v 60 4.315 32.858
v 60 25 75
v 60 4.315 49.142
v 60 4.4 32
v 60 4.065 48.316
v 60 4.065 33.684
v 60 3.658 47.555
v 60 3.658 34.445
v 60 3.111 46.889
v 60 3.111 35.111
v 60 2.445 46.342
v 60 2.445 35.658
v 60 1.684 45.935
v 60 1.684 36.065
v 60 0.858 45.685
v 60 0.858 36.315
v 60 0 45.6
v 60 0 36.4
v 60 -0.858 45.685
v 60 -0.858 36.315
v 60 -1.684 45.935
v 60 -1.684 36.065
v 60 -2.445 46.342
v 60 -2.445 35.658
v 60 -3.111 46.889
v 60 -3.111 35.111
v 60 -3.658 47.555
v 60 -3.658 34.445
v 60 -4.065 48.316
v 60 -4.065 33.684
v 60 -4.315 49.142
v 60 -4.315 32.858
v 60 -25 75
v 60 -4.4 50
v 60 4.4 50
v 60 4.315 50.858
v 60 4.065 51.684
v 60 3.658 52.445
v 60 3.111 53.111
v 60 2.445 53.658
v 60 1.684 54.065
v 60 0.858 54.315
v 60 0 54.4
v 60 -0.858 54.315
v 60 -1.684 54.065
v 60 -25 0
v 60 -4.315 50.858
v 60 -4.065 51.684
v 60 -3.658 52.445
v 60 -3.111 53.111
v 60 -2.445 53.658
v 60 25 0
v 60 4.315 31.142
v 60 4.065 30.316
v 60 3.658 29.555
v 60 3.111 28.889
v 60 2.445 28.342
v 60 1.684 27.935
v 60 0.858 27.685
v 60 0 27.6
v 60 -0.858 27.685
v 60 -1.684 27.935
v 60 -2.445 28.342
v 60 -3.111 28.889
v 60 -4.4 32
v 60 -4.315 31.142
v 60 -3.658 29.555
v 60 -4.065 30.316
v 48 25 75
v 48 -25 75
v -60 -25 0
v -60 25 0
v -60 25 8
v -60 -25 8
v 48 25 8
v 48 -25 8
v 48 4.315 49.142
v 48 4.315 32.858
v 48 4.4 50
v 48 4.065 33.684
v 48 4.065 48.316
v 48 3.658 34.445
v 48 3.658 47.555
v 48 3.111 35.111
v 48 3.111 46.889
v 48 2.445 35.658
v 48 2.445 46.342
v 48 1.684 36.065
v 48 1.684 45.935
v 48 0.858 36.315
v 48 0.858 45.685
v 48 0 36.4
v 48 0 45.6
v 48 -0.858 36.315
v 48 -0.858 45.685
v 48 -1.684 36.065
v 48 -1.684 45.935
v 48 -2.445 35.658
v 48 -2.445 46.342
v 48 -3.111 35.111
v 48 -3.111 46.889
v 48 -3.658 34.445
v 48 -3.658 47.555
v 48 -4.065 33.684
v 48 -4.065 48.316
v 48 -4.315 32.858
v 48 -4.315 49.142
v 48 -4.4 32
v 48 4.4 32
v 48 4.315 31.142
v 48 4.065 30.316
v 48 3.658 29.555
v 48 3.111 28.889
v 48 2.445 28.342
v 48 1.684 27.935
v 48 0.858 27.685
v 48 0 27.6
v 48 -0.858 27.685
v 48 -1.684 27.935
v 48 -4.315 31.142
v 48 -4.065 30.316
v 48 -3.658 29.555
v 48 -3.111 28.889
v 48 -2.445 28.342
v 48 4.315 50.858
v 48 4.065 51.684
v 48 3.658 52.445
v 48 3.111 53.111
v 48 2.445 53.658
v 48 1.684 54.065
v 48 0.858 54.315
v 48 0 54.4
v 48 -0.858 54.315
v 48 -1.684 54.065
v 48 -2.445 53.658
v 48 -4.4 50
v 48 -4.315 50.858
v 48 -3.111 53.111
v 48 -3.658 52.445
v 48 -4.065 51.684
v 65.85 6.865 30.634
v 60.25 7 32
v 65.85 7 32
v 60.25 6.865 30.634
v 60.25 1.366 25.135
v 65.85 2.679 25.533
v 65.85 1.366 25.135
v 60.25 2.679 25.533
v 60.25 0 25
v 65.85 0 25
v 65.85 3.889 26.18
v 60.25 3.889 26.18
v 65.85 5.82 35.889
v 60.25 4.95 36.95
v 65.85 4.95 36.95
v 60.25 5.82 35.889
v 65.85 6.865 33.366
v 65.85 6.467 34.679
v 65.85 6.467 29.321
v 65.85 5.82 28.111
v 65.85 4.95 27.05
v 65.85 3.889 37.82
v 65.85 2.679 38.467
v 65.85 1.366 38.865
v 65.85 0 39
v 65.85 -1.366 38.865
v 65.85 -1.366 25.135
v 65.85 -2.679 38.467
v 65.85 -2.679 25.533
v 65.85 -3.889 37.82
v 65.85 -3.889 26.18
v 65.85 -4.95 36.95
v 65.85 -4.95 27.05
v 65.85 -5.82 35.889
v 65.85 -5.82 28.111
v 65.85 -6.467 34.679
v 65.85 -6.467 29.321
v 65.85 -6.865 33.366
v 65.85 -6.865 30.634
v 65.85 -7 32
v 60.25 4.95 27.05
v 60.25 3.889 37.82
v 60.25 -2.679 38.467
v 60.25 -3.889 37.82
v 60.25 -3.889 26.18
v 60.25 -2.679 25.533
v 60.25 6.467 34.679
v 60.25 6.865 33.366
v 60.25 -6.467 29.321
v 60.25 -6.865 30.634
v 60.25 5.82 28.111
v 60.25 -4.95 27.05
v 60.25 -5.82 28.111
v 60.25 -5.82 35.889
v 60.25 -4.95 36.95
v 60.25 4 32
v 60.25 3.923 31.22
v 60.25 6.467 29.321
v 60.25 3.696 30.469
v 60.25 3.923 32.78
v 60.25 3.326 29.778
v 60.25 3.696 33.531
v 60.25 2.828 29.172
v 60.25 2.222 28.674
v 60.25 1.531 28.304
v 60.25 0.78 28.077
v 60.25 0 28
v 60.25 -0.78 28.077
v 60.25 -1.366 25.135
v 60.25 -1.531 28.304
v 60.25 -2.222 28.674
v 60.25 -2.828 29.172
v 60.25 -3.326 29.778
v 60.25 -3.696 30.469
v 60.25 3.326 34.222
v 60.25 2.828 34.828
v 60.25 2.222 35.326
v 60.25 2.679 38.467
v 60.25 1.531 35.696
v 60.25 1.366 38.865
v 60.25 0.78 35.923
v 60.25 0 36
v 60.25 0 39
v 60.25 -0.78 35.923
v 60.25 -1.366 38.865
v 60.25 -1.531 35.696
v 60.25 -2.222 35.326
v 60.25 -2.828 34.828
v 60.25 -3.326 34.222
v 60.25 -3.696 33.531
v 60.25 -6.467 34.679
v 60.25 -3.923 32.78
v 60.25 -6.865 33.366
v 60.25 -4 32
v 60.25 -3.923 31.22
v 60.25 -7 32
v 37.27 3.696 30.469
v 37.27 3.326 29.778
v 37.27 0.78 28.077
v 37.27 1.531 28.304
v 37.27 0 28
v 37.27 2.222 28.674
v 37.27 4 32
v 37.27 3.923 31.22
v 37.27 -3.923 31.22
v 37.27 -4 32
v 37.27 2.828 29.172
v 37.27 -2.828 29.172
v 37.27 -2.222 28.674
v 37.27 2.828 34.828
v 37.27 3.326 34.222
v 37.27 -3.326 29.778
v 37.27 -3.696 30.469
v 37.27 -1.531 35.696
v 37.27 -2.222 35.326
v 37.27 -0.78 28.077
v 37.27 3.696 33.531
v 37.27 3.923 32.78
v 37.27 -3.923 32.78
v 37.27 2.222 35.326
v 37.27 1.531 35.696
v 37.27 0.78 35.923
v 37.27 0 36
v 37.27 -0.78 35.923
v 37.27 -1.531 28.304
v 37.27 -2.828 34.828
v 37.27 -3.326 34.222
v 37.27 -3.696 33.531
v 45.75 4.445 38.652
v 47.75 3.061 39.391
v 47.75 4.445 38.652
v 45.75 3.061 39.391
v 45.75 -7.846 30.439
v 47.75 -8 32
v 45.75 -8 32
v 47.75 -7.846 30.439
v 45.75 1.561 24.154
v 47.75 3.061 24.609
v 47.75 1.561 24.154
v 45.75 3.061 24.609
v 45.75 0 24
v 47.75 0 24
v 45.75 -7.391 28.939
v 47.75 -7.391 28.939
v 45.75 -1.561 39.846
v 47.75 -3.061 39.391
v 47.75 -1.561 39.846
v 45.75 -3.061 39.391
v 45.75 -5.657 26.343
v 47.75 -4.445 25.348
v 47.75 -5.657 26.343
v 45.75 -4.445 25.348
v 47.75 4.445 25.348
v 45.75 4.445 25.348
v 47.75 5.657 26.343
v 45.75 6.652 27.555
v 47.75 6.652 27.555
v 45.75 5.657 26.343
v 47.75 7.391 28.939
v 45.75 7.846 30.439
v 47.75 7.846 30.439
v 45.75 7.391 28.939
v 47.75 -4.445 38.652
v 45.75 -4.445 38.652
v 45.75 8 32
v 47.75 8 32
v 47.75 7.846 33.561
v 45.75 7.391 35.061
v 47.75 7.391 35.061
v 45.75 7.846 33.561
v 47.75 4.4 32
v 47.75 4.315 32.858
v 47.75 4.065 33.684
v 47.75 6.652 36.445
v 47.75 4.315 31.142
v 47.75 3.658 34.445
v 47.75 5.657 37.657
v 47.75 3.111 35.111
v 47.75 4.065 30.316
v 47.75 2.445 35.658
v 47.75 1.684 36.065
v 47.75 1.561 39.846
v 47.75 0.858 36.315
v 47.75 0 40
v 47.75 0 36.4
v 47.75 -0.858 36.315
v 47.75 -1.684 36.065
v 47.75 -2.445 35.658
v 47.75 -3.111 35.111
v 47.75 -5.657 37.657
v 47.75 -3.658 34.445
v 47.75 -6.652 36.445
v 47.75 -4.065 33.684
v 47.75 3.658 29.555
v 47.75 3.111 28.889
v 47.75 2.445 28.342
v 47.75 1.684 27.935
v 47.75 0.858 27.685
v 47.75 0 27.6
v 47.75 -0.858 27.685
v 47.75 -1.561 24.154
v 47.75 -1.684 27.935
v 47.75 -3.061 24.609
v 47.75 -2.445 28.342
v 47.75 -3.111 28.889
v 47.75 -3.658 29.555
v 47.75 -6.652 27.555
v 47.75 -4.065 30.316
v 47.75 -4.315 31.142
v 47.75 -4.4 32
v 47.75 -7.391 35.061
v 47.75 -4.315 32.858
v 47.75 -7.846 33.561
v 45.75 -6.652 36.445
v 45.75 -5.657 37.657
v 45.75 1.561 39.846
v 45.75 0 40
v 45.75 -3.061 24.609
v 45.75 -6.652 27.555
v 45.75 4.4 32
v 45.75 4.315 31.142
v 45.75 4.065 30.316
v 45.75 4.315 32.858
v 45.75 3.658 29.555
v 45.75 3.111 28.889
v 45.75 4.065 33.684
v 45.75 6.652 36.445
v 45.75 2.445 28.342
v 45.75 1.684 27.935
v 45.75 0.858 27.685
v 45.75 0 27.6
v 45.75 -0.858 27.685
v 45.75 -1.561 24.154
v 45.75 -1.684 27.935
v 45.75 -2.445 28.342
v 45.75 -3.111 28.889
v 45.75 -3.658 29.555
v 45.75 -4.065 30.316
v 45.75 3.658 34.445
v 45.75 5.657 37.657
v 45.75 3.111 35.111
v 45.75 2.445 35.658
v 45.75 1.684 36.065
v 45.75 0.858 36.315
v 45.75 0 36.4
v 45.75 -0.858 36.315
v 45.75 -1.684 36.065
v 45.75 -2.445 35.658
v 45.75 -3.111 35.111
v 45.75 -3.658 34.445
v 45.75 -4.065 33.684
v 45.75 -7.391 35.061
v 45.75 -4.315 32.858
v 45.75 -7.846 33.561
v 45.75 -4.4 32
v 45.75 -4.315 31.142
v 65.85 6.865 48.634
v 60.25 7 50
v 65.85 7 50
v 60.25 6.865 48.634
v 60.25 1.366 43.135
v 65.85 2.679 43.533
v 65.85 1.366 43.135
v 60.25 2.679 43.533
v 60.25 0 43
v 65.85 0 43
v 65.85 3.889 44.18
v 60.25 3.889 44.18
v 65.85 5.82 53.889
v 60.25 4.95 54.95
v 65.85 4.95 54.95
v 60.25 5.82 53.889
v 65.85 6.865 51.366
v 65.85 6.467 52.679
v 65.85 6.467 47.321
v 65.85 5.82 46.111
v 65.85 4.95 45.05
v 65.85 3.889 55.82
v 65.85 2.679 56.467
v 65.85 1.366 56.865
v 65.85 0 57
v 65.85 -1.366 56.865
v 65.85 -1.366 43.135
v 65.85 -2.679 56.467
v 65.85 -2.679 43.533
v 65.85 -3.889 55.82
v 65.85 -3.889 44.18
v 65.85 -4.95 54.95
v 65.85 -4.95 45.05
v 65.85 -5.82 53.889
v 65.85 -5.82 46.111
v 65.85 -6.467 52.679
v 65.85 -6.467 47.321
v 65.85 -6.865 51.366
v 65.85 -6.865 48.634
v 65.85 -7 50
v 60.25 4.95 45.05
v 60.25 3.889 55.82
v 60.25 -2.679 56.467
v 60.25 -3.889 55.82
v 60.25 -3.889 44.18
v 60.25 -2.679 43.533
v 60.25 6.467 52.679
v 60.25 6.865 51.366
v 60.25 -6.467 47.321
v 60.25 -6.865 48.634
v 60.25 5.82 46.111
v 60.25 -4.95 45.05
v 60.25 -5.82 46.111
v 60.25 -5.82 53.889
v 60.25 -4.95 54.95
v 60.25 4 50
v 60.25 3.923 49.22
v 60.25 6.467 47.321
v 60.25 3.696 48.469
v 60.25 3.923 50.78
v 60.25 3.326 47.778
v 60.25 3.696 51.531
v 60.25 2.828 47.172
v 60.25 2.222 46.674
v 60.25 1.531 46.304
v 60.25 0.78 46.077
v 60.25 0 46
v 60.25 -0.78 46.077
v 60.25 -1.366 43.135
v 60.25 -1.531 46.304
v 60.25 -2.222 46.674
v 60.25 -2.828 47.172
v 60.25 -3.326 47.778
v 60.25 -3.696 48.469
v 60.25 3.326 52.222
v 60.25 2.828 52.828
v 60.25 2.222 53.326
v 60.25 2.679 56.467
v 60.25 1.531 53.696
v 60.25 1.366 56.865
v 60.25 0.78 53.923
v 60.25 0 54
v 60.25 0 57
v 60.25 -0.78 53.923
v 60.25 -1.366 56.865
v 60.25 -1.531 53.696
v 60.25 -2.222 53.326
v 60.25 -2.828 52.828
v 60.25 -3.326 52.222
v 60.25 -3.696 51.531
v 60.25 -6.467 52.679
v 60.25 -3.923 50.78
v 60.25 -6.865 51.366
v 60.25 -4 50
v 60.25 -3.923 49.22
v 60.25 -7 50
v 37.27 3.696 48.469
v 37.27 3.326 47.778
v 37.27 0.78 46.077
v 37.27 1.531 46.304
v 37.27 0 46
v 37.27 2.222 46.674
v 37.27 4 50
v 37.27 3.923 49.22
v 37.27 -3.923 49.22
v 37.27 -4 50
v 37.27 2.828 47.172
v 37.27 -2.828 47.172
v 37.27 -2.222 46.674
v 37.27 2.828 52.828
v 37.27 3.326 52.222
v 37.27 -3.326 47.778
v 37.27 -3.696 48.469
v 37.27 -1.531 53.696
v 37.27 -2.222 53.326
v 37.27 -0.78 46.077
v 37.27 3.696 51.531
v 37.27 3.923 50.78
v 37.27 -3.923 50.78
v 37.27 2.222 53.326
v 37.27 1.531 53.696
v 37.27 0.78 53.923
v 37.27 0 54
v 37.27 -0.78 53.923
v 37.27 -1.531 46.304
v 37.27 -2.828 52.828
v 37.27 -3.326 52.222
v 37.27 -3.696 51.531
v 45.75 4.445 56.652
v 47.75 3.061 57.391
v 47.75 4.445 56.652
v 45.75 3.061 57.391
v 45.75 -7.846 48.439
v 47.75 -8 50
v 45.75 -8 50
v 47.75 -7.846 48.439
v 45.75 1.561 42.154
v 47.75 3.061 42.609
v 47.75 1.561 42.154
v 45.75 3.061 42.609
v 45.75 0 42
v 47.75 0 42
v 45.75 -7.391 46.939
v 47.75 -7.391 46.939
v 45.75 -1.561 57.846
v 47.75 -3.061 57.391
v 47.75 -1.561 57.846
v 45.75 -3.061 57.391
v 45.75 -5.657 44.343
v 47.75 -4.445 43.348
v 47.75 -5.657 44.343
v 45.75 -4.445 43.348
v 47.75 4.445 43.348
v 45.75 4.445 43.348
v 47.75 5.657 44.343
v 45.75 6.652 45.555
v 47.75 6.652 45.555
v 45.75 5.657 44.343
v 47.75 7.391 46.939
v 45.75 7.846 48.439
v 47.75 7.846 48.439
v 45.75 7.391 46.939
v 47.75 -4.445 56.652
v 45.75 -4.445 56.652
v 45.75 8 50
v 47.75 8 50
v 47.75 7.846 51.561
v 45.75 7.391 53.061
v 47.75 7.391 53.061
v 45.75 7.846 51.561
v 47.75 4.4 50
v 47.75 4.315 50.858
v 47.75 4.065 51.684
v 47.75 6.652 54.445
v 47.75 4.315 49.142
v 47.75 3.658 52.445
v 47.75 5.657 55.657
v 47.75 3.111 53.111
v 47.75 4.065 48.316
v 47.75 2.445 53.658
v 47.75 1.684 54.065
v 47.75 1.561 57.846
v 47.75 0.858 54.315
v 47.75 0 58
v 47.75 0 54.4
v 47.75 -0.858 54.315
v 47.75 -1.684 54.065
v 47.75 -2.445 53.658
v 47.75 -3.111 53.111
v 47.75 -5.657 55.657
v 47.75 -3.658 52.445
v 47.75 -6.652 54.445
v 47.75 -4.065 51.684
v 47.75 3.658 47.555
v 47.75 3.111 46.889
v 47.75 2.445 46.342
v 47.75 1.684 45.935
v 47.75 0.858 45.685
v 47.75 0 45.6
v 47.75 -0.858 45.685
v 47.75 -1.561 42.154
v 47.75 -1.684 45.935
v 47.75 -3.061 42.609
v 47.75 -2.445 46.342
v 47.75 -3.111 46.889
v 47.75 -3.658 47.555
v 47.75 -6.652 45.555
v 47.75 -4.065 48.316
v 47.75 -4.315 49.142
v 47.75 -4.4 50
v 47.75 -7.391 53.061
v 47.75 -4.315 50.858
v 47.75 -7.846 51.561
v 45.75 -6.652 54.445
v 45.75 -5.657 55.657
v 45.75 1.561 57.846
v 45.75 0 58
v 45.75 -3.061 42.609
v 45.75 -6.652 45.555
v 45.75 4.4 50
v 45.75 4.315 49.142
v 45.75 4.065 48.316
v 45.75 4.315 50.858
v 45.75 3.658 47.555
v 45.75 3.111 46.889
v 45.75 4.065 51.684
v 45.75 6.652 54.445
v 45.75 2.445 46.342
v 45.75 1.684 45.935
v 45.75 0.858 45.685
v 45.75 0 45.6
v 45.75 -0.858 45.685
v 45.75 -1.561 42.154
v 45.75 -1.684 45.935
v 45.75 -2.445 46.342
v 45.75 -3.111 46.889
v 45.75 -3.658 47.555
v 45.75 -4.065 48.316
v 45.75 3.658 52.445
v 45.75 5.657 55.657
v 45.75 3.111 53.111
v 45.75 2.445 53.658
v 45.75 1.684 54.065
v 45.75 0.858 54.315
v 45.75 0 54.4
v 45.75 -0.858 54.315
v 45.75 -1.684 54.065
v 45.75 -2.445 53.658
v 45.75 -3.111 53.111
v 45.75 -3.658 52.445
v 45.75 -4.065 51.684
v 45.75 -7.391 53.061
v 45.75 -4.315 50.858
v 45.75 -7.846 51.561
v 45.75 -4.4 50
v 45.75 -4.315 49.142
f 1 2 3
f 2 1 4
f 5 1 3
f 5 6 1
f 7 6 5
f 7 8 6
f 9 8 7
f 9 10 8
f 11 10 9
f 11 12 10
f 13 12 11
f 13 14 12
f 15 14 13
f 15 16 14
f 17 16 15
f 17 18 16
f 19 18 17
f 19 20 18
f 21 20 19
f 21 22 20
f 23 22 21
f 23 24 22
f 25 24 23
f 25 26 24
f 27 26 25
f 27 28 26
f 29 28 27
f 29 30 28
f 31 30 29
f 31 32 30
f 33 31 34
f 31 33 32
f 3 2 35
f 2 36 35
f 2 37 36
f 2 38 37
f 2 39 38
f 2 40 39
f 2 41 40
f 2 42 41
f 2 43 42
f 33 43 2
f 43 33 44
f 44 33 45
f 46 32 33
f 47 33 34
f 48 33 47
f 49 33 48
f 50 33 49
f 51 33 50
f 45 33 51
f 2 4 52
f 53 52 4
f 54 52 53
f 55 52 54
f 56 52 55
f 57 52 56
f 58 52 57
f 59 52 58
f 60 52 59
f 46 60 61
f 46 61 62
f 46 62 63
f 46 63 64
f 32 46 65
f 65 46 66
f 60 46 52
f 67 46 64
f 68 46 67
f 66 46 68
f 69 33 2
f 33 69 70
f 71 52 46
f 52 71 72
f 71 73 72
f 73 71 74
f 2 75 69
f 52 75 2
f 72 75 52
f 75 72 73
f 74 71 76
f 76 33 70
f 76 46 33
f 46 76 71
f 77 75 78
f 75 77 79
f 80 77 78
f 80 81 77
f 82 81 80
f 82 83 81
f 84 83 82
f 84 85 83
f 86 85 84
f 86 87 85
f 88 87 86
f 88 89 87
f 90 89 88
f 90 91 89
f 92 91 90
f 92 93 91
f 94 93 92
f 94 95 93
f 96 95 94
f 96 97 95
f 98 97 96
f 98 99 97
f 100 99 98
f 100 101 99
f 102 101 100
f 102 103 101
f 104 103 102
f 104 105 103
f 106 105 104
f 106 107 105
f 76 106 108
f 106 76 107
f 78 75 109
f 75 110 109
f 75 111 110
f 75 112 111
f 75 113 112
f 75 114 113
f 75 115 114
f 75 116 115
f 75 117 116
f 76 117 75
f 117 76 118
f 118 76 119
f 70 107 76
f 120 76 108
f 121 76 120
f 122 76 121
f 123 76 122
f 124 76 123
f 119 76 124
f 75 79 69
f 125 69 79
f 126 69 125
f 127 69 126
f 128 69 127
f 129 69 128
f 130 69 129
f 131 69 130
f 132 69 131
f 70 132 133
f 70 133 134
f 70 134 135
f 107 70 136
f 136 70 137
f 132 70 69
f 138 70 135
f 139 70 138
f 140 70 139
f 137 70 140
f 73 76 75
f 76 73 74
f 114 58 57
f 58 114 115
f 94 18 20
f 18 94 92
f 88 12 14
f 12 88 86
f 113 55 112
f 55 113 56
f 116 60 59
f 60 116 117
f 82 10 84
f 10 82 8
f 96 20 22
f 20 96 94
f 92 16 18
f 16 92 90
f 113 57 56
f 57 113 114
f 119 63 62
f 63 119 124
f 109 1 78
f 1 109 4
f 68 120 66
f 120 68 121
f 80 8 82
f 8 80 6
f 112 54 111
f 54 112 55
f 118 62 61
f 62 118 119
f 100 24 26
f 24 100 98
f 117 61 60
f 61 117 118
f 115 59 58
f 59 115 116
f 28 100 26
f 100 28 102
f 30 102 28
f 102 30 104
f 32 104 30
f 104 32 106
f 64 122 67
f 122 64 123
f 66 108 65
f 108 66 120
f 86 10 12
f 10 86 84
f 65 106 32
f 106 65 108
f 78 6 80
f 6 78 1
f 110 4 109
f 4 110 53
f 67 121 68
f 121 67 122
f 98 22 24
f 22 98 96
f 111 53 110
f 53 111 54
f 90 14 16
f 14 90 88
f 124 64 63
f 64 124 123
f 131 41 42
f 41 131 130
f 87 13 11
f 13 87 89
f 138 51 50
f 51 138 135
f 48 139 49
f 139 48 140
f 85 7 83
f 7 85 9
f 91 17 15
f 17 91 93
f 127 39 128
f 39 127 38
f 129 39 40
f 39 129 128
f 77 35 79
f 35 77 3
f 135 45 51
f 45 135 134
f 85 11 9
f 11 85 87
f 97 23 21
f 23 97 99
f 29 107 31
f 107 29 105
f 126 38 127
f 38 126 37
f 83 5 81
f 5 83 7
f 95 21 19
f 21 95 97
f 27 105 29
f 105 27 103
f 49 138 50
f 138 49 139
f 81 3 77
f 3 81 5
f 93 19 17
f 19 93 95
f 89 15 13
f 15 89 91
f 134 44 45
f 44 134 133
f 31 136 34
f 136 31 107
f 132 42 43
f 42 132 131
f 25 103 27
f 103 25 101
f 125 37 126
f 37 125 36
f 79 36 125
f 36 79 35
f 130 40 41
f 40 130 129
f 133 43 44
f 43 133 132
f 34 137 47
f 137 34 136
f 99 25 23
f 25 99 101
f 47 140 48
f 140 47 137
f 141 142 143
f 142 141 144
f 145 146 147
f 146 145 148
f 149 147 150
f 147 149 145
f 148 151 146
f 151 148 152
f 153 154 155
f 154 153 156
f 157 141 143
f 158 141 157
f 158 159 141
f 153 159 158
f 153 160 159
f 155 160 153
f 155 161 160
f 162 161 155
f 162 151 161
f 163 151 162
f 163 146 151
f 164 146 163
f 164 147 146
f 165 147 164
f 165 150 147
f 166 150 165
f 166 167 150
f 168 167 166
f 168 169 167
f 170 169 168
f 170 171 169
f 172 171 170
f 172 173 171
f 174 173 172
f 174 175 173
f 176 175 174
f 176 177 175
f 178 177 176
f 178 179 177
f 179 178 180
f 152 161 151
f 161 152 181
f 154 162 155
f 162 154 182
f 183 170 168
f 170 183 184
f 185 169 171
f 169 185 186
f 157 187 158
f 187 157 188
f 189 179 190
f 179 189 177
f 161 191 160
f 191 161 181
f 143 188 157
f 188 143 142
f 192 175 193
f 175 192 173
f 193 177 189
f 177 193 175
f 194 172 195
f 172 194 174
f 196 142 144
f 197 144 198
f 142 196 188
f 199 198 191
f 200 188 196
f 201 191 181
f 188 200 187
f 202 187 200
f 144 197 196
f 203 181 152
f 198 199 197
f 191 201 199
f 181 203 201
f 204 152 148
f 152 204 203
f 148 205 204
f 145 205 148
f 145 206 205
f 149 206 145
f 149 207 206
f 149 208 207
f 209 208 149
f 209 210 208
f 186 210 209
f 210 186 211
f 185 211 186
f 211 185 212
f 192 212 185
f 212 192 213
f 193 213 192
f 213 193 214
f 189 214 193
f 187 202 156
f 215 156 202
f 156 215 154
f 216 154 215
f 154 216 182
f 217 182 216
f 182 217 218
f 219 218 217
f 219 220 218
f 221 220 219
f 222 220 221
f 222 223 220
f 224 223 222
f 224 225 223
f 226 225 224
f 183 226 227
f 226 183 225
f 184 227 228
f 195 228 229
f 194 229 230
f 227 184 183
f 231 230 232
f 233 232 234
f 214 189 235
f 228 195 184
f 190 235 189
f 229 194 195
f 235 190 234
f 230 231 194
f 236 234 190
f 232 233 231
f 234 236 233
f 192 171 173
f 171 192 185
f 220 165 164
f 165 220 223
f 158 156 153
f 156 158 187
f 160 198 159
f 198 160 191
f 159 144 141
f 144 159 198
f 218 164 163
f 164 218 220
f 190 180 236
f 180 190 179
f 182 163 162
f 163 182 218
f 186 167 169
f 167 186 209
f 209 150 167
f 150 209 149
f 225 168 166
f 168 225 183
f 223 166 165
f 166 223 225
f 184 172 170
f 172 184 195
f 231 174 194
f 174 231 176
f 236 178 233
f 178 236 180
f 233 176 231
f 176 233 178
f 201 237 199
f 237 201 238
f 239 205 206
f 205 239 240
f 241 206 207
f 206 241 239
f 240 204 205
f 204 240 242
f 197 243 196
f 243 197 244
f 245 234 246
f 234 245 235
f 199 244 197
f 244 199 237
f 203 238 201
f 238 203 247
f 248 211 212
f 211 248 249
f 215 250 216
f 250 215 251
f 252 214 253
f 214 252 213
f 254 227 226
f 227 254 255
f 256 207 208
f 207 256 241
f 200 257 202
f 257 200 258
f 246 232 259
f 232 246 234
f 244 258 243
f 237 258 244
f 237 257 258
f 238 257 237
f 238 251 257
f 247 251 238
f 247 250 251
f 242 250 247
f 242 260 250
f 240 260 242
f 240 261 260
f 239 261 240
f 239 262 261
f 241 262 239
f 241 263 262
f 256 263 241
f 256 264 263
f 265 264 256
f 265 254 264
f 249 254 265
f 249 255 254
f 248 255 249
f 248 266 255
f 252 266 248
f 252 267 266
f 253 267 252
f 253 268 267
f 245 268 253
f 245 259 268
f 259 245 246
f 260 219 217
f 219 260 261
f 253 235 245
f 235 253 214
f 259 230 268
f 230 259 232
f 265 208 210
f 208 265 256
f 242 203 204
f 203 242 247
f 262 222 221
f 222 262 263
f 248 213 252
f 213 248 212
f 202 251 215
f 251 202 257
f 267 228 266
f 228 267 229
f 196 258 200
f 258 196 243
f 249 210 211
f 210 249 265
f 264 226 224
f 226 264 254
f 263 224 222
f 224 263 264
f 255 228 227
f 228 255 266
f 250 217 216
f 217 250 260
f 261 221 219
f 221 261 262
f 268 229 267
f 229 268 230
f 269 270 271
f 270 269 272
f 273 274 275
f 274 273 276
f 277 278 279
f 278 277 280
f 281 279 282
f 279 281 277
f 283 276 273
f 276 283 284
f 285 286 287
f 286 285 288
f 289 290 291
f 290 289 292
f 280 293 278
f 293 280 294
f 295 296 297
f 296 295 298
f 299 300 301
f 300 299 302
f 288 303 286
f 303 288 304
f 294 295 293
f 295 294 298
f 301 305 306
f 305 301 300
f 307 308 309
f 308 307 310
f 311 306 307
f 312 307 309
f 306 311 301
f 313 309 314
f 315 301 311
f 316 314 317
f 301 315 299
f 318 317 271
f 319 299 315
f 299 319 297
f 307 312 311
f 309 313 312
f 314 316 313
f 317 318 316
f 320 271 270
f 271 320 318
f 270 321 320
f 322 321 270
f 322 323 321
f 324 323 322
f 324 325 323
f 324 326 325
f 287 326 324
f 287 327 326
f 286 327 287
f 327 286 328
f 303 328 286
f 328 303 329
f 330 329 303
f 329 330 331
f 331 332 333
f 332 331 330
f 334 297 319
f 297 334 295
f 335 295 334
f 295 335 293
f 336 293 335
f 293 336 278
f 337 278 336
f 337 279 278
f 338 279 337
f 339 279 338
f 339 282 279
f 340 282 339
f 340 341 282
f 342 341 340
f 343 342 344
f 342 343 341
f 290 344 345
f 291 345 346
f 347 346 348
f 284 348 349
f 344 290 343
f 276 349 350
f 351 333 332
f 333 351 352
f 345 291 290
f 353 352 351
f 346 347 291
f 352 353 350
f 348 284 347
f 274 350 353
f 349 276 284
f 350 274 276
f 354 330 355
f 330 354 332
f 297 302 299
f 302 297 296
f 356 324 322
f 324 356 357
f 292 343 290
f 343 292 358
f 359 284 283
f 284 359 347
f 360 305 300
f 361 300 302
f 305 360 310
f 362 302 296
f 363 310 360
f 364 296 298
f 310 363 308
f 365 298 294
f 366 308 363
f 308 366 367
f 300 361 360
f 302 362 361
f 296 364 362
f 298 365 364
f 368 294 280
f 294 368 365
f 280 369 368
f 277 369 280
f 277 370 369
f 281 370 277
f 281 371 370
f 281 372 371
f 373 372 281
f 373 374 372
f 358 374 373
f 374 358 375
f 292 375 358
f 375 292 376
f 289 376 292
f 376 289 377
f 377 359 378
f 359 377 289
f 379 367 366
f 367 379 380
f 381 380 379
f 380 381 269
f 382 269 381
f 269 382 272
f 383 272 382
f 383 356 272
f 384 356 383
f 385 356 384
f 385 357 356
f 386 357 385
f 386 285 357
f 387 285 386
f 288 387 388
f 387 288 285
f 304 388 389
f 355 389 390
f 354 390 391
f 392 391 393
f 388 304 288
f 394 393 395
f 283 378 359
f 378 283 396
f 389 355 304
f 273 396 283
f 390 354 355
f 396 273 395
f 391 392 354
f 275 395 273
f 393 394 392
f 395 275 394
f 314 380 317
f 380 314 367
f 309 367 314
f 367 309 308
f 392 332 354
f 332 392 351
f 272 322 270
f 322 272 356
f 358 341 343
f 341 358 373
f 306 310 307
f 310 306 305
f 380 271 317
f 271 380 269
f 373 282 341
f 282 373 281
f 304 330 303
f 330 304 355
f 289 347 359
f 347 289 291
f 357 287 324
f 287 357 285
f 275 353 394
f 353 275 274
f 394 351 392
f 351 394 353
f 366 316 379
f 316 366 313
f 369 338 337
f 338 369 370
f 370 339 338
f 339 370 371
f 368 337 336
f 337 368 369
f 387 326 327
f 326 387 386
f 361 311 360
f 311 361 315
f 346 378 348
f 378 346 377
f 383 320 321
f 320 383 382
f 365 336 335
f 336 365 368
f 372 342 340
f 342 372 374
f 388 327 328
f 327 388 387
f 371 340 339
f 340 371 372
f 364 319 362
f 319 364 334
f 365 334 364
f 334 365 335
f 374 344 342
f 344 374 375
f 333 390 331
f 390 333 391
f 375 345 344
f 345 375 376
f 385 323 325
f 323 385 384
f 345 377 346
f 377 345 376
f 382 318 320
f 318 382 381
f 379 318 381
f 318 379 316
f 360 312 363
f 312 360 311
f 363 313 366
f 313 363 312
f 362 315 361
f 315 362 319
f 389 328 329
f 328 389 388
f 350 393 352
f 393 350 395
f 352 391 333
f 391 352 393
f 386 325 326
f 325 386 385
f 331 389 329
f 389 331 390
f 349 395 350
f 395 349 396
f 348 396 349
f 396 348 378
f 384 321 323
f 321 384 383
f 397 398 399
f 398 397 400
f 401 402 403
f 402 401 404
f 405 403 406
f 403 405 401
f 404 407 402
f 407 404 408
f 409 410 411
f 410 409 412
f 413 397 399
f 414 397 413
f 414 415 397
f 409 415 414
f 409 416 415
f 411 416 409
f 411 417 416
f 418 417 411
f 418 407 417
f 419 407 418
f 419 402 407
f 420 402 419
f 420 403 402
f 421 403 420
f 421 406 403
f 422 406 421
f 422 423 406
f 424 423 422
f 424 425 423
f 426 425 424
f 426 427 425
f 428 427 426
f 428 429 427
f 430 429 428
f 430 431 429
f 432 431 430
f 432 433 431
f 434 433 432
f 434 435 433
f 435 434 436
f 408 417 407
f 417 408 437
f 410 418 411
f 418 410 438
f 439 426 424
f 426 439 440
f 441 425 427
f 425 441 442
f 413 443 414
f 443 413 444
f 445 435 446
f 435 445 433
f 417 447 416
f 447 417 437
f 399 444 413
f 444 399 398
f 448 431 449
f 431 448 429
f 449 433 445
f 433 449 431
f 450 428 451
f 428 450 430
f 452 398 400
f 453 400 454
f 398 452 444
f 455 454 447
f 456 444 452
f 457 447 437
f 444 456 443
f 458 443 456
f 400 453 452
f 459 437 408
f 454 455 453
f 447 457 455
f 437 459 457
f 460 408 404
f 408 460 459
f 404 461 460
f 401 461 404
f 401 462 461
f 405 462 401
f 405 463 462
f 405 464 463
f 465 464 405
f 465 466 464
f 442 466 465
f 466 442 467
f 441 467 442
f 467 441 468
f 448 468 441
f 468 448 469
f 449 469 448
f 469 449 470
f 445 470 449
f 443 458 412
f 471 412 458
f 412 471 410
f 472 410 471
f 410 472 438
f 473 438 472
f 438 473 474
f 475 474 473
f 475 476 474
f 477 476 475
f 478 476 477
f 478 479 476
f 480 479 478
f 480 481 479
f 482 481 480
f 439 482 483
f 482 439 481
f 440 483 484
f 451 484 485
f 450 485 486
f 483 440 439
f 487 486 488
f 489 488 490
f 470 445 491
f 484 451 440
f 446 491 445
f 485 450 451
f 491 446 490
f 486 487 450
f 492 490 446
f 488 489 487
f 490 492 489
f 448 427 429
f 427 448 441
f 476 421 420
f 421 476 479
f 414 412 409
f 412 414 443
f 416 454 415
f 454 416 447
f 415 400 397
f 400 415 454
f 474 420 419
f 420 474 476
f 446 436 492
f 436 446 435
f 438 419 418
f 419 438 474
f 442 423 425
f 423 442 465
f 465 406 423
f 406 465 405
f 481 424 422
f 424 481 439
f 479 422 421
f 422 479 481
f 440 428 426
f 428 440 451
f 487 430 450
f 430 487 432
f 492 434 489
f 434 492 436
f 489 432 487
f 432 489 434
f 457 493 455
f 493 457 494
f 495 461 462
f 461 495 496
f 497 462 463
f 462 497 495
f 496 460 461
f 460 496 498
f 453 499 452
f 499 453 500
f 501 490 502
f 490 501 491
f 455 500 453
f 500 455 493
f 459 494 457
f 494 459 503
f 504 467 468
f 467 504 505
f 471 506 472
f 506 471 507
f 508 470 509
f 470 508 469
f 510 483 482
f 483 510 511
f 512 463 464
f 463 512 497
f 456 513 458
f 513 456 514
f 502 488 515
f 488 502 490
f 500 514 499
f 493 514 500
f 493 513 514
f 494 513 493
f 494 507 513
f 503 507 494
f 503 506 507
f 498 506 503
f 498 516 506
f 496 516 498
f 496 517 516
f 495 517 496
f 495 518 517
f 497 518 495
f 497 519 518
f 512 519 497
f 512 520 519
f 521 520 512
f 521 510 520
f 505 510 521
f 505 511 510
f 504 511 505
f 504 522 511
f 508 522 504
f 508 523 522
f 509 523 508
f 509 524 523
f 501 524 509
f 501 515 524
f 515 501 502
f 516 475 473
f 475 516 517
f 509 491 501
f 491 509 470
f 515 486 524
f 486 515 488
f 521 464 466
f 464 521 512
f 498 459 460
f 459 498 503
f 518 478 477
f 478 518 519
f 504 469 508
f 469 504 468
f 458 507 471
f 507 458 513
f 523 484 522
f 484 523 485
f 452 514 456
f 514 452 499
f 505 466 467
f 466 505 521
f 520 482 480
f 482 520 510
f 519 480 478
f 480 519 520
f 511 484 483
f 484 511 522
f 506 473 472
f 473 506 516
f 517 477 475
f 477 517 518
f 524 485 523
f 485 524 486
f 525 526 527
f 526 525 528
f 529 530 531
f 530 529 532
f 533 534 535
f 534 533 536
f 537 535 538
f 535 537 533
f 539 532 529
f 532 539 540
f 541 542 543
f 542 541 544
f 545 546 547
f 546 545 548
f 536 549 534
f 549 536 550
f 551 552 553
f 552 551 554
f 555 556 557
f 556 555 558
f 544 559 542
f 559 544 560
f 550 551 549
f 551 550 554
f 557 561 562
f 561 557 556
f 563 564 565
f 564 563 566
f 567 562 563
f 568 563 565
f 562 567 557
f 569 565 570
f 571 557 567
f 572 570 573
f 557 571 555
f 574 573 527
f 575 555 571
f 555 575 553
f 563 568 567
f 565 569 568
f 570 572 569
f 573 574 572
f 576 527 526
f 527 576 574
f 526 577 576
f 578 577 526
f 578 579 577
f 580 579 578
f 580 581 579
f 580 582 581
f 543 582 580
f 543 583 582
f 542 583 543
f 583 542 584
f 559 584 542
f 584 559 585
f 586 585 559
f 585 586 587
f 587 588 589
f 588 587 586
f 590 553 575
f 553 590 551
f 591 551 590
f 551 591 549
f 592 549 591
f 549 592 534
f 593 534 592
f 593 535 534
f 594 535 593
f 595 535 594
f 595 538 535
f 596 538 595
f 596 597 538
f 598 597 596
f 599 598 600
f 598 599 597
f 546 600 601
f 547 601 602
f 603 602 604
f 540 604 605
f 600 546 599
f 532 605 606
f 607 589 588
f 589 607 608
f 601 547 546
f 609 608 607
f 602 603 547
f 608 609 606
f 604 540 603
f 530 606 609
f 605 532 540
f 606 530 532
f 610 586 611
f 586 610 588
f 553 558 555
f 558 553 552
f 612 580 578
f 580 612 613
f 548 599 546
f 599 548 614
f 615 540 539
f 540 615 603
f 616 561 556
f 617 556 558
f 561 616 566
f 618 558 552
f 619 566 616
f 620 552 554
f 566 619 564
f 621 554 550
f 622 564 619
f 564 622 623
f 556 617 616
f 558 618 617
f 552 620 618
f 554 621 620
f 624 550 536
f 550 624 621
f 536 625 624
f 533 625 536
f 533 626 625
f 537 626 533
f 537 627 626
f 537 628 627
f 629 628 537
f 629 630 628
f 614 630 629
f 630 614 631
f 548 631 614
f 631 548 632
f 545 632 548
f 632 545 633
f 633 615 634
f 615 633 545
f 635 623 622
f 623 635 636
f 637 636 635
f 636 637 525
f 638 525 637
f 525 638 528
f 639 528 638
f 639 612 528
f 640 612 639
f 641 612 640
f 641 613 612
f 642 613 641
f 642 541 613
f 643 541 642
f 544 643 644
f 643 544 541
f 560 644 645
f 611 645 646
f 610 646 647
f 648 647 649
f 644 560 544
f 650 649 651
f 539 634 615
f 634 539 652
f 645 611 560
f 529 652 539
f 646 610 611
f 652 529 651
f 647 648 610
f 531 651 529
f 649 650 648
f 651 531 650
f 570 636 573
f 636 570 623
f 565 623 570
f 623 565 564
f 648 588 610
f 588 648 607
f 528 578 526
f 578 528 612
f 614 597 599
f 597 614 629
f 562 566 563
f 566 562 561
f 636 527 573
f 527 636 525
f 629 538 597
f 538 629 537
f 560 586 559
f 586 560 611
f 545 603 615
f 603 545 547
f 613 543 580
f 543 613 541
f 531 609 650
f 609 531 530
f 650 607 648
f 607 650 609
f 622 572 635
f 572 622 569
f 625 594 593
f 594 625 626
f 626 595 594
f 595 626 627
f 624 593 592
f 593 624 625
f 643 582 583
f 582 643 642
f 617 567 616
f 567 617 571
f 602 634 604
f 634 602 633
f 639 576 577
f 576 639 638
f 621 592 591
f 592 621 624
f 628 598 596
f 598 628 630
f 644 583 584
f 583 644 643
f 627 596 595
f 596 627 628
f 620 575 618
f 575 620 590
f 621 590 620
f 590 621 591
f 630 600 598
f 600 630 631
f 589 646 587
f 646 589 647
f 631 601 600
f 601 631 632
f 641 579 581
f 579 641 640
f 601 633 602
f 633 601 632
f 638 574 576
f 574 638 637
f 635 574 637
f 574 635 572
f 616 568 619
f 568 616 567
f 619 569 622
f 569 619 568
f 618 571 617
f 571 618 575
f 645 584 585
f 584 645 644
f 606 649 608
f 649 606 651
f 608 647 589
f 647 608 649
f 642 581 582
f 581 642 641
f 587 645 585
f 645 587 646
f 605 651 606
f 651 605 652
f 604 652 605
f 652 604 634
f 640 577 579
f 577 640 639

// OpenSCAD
$fn = 32;

// ------------------------------------------------------------------------
// Bolted bracket: 120 x 50 mm bracket with 2 bolt joints
// Every part is its own module, assembly() places them once.
// ------------------------------------------------------------------------

// --- part 1 ---
module bracket() {
  difference() {
    translate([-60, -25, 0]) cube([120, 50, 75]);
    translate([-61, -26, 8]) cube([109, 52, 68]);
    translate([54, 0, 32]) rotate([0, 90, 0]) cylinder(h = 14, d = 8.8, center = true);
    translate([54, 0, 50]) rotate([0, 90, 0]) cylinder(h = 14, d = 8.8, center = true);
  }
}

// --- part 2 ---
module bolt1() {
  cylinder(h = 5.6, d = 14);
  translate([0, 0, -22.98]) cylinder(h = 22.98, d = 8);
}

// --- part 3 ---
module washer1() {
  difference() {
      translate([0, 0, 0]) cylinder(h = 2, d = 16);
      translate([0, 0, -1]) cylinder(h = 4, d = 8.8);
    }
}

// --- part 4 ---
module bolt2() {
  cylinder(h = 5.6, d = 14);
  translate([0, 0, -22.98]) cylinder(h = 22.98, d = 8);
}

// --- part 5 ---
module washer2() {
  difference() {
      translate([0, 0, 0]) cylinder(h = 2, d = 16);
      translate([0, 0, -1]) cylinder(h = 4, d = 8.8);
    }
}

// --- assembly ---
module assembly() {
  translate([0, 0, 0]) rotate([0, 0, 0]) bracket();
  translate([60.25, 0, 32]) rotate([0, 90, 0]) bolt1();
  translate([45.75, 0, 32]) rotate([0, 90, 0]) washer1();
  translate([60.25, 0, 50]) rotate([0, 90, 0]) bolt2();
  translate([45.75, 0, 50]) rotate([0, 90, 0]) washer2();
}

assembly();
